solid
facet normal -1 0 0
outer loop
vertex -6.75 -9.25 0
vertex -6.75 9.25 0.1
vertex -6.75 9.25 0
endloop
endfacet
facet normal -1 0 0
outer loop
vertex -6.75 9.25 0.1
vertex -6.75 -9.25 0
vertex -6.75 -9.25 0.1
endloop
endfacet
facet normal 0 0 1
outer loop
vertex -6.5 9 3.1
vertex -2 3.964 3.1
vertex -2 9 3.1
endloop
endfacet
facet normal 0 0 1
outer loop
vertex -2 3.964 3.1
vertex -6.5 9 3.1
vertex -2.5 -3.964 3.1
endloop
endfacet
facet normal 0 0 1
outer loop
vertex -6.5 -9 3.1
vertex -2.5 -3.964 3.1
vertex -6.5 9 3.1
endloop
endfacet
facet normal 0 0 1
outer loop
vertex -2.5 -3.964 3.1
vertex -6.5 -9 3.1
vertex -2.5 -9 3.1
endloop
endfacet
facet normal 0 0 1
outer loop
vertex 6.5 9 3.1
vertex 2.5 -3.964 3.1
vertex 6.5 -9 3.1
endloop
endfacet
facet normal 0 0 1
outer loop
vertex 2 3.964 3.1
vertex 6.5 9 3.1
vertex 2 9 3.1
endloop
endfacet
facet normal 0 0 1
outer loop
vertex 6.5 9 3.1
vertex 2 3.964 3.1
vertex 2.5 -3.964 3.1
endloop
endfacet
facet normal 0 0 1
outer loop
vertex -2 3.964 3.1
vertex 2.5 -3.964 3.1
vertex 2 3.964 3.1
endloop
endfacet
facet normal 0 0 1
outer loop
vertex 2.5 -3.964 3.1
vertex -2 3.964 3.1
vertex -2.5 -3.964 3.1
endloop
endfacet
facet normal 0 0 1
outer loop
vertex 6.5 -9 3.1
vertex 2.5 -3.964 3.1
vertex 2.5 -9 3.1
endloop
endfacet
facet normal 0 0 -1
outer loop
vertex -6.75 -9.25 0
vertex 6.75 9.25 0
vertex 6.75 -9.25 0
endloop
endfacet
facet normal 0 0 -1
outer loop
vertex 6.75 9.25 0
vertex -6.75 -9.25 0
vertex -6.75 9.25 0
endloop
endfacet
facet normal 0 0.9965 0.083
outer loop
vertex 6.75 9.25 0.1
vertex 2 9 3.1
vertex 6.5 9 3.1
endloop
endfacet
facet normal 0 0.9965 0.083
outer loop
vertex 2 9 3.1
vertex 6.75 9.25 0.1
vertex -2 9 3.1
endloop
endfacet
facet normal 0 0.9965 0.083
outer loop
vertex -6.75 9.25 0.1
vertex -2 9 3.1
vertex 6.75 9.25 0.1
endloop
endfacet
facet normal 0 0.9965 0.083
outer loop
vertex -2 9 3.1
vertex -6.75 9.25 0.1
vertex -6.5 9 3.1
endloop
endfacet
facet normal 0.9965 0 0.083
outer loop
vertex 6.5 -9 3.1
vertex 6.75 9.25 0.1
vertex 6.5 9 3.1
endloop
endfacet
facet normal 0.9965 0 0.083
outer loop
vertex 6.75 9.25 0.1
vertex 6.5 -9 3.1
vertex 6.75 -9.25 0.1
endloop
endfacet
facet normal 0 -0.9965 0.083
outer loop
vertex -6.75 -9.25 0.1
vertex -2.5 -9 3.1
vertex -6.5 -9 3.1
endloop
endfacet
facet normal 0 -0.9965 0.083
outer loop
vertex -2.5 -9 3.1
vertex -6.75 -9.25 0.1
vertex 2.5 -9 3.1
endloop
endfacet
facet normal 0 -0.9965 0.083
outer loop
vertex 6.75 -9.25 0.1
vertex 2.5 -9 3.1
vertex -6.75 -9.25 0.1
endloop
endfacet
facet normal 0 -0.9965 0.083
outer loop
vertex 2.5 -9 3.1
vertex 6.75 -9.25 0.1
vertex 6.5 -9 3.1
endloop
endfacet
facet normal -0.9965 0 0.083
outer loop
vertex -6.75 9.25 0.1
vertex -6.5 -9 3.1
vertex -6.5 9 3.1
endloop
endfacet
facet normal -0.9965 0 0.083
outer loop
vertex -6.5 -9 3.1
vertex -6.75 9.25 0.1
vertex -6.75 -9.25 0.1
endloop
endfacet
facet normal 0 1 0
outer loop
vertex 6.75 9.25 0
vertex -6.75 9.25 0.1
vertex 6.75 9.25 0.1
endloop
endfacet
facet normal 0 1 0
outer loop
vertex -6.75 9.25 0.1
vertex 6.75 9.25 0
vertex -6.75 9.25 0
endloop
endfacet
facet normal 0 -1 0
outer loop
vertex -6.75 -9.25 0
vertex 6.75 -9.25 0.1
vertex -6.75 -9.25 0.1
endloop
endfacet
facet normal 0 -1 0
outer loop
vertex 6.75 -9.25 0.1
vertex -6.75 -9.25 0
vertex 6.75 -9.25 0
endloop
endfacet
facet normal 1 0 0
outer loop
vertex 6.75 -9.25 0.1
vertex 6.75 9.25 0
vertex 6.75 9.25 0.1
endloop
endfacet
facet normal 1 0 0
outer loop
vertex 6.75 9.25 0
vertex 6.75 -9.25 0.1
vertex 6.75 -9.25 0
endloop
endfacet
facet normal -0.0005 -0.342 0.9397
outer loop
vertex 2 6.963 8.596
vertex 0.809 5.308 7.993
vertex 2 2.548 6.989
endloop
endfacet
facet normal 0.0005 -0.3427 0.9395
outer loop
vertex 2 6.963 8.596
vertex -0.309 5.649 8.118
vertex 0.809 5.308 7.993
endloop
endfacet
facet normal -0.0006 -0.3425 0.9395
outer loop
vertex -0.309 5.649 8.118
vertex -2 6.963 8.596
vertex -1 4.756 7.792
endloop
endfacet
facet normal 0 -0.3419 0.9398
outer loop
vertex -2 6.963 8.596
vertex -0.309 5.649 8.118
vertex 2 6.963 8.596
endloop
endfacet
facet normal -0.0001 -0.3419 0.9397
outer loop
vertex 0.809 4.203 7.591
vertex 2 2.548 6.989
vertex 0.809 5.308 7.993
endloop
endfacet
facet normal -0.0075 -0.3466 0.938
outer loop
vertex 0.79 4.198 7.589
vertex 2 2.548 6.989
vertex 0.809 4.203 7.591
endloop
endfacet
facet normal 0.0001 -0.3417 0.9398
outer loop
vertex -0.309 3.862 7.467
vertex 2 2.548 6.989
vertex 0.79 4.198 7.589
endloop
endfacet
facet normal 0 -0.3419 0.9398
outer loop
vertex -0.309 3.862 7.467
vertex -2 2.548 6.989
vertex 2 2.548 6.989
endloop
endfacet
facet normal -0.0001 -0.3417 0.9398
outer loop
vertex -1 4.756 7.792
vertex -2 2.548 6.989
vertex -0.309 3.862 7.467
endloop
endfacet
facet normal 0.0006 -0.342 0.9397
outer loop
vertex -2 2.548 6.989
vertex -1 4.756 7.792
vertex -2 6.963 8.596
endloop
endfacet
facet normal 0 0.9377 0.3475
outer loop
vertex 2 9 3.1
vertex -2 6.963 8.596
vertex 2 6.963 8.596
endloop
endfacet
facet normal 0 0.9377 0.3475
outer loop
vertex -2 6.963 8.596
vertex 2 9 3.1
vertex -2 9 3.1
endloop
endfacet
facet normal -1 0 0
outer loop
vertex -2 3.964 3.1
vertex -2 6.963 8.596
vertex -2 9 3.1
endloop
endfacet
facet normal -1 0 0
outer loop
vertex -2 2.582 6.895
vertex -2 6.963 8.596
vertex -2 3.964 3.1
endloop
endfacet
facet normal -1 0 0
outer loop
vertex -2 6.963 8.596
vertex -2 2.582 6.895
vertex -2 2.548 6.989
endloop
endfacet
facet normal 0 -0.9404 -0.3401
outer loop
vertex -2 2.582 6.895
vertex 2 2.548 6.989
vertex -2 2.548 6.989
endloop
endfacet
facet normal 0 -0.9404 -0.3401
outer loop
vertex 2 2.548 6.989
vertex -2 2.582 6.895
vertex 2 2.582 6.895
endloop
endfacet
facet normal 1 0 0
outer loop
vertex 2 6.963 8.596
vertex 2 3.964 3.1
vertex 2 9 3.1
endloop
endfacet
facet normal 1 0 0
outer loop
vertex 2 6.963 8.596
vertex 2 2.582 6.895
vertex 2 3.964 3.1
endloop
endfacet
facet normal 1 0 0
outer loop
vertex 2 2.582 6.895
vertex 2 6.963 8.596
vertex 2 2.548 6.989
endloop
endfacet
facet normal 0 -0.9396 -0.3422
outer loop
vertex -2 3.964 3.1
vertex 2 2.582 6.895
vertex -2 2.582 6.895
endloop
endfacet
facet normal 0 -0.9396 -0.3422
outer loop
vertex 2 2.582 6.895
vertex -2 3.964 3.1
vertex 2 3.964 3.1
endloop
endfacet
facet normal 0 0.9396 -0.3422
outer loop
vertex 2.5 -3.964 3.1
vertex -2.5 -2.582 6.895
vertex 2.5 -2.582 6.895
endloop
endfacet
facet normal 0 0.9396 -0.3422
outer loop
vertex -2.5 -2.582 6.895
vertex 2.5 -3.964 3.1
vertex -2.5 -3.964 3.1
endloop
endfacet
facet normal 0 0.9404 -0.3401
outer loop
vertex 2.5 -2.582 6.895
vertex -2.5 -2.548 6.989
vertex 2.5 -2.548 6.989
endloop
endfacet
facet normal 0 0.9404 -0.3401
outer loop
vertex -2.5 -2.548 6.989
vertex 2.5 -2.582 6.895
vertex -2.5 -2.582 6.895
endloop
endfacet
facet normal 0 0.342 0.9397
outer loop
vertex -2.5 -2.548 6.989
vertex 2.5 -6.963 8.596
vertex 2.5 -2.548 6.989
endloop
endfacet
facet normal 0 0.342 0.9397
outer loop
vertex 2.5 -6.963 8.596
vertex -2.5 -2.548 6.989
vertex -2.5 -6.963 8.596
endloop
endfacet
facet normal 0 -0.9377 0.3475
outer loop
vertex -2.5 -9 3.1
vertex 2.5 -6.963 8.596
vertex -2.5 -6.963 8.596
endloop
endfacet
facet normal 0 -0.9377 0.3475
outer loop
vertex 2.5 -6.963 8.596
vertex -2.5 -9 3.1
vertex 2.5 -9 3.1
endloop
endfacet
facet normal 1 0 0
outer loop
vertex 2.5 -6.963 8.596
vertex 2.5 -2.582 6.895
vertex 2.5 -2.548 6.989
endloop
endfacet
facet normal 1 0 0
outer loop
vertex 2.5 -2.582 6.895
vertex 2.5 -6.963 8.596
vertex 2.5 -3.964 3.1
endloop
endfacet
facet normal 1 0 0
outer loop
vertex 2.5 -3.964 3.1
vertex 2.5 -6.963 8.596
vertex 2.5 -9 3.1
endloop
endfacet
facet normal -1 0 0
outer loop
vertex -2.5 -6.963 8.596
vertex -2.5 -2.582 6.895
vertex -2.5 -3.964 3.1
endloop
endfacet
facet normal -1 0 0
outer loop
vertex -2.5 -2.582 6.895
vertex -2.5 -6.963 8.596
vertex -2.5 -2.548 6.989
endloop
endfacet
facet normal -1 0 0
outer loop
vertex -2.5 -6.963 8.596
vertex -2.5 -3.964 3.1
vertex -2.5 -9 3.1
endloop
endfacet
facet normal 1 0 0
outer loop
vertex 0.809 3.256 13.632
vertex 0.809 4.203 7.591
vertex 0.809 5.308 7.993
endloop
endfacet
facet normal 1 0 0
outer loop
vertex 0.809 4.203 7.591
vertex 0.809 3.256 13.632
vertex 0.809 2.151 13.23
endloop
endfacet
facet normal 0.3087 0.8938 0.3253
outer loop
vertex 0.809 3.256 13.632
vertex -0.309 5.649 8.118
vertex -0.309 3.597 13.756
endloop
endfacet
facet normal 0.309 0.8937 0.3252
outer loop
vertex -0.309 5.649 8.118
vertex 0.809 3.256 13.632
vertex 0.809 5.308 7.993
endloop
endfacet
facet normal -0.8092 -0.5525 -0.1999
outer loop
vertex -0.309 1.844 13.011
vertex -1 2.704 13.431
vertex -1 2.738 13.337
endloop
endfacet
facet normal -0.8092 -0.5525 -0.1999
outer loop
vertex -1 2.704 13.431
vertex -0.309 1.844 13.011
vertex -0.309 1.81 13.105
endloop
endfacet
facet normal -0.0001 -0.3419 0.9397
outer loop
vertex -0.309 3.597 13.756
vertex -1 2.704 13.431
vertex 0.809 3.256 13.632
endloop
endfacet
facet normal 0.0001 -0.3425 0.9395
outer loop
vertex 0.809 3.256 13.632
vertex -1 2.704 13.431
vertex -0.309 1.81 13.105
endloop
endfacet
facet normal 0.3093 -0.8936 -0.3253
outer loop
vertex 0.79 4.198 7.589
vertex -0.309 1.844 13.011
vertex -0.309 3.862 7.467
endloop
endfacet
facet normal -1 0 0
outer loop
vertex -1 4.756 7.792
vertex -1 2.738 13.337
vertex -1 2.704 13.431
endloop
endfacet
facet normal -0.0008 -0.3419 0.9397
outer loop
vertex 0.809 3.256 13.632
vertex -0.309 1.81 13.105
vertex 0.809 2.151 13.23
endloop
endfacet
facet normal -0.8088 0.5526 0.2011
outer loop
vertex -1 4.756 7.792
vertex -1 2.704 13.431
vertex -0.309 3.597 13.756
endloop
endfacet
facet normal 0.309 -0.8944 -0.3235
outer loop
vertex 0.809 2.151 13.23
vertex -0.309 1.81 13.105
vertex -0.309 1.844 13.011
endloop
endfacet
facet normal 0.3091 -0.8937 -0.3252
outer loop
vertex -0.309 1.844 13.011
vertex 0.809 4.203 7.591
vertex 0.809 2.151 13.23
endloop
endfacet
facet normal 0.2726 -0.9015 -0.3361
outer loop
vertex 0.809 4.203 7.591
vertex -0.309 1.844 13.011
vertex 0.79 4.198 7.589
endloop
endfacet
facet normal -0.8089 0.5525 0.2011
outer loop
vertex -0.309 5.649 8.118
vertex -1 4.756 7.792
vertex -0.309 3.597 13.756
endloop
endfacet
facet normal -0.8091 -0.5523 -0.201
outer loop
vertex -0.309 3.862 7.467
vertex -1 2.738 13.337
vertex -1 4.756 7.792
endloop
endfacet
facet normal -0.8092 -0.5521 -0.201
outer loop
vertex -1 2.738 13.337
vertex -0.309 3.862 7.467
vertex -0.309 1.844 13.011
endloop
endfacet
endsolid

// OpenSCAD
module cube(
v1,
v2,
v1_square_length,
v1_square_width,
v2_square_length,
v2_square_width,

sup_length,
sup_width,
sup_hight,
sup_angle,

oppsite_sup_length,
oppsite_sup_width,
oppsite_sup_hight,
oppsite_sup_angle,


kinpin_radius,
kinpin_hight,
poly_num



){
z_axis=[0,0,1];
y_axis=[0,1,0];
//求出內積
 function dot_p(v1,v2,index)=      
      v1[index]*v2[index]+
      (index>0?
       dot_p(v1,v2,index-1):0);      
function dot_product(v1,v2)=
     dot_p(v1,v2,len(v1)-1);
//求出法向量
function normal_v(v1,v2)=[v2.x-v1.x,v2.y-v1.y,v2.z-v1.z];
echo(normal_v(v1,v2));
//求出法向量在xy平面投影向量 
function dot_product_xy(v)=[v.x,v.y,0];
//利用內積求出角度
function angle(v1,v2)=
     norm(v1)==0 || norm(v2)==0?
     0:
     acos((dot_product(v1,v2))/(norm(v1)*norm(v2)));
//xy平面投影法向量與y軸角度
echo(angle(dot_product_xy(normal_v(v1,v2)),y_axis));


hull(){
    translate(v1)
rotate(angle(normal_v(v1,v2),z_axis),cross(z_axis,normal_v(v1,v2)))
rotate(angle(dot_product_xy(normal_v(v1,v2)),y_axis),z_axis)
    linear_extrude(.1)
square([v1_square_width,v1_square_length],center=true);
translate(v2)
rotate(angle(normal_v(v1,v2),z_axis),cross(z_axis,normal_v(v1,v2)))
rotate(angle(dot_product_xy(normal_v(v1,v2)),y_axis),z_axis)
    linear_extrude(.1)
square([v2_square_width,v2_square_length],center=true);
}


sup_v1=([v2.x,v2.y+v2_square_length/2-sup_length/2,v2.z]);
sup_v2=([v2.x,v2.y+(v2_square_length/2-(sup_length/2+sup_hight*cos(sup_angle))),v2.z+sin(sup_angle)*sup_hight]);
hull(){

translate(sup_v1)
rotate(angle(normal_v(v1,v2),z_axis),cross(z_axis,normal_v(v1,v2)))
rotate(angle(dot_product_xy(normal_v(v1,v2)),y_axis),z_axis)
    linear_extrude(.1)
    square([sup_width,sup_length],center=true);

translate(sup_v2) 
     rotate(angle(normal_v(sup_v1,sup_v2),z_axis),cross(z_axis,normal_v(sup_v1,sup_v2)))     
     rotate(angle(dot_product_xy(normal_v(sup_v1,sup_v2)),y_axis),z_axis)
     linear_extrude(.1)
     square([sup_width,sup_length*sin(180-sup_angle)],center=true);
}

//--------------------------------------------------------------
oppsite_sup_v1=([v2.x,
                v2.y-(v2_square_length/2-oppsite_sup_length/2),
                v2.z]);
oppsite_sup_v2=([v2.x,
                v2.y-(v2_square_length/2-(oppsite_sup_length/2+oppsite_sup_hight*cos(oppsite_sup_angle))),
               v2.z+sin(oppsite_sup_angle)*oppsite_sup_hight]);


hull(){
translate(oppsite_sup_v1)
rotate(angle(normal_v(v1,v2),z_axis),cross(z_axis,normal_v(v1,v2)))
rotate(angle(dot_product_xy(normal_v(v1,v2)),y_axis),z_axis)
    linear_extrude(.1)
    square([oppsite_sup_width,oppsite_sup_length],center=true);


translate(oppsite_sup_v2)
     rotate(angle(normal_v(oppsite_sup_v1,oppsite_sup_v2),z_axis),cross(z_axis,normal_v(oppsite_sup_v1,oppsite_sup_v2)))     
     rotate(angle(dot_product_xy(normal_v(oppsite_sup_v1,oppsite_sup_v2)),y_axis),z_axis)
     linear_extrude(.1)
     square([oppsite_sup_width,oppsite_sup_length*sin(180-oppsite_sup_angle)],center=true);
}



//  kinpin--------------------------------------------------------



kinpin_v1=[sup_v2.x,
           sup_v2.y-kinpin_hight*cos(sup_angle),
           sup_v2.z+sin(sup_angle)*kinpin_hight
];



   hull(){

    translate(sup_v2)
    rotate(angle(normal_v(sup_v2,kinpin_v1),z_axis),cross(z_axis,normal_v(sup_v2,kinpin_v1)))
    rotate(angle(dot_product_xy(normal_v(sup_v2,kinpin_v1)),y_axis),z_axis)
    linear_extrude(.1)
    circle(kinpin_radius);
    
    translate(kinpin_v1)
    rotate(angle(normal_v(sup_v2,kinpin_v1),z_axis),cross(z_axis,normal_v(sup_v2,kinpin_v1)))
    rotate(angle(dot_product_xy(normal_v(sup_v2,kinpin_v1)),y_axis),z_axis)
    linear_extrude(.1)
    circle(kinpin_radius);
     
   }
   
   
    
    






}

cube(
v1=[0,0,0],
v2=[0,0,3],
v1_square_length=18.5,
v1_square_width=13.5,
v2_square_length=18,
v2_square_width=13,


sup_length=5,
sup_width=4,
sup_hight=5,
sup_angle=70,


oppsite_sup_length=5,
oppsite_sup_width=5,
oppsite_sup_hight=5,
oppsite_sup_angle=70,


kinpin_radius=1,
kinpin_hight=6,
poly_num=360


);


    
    
    
